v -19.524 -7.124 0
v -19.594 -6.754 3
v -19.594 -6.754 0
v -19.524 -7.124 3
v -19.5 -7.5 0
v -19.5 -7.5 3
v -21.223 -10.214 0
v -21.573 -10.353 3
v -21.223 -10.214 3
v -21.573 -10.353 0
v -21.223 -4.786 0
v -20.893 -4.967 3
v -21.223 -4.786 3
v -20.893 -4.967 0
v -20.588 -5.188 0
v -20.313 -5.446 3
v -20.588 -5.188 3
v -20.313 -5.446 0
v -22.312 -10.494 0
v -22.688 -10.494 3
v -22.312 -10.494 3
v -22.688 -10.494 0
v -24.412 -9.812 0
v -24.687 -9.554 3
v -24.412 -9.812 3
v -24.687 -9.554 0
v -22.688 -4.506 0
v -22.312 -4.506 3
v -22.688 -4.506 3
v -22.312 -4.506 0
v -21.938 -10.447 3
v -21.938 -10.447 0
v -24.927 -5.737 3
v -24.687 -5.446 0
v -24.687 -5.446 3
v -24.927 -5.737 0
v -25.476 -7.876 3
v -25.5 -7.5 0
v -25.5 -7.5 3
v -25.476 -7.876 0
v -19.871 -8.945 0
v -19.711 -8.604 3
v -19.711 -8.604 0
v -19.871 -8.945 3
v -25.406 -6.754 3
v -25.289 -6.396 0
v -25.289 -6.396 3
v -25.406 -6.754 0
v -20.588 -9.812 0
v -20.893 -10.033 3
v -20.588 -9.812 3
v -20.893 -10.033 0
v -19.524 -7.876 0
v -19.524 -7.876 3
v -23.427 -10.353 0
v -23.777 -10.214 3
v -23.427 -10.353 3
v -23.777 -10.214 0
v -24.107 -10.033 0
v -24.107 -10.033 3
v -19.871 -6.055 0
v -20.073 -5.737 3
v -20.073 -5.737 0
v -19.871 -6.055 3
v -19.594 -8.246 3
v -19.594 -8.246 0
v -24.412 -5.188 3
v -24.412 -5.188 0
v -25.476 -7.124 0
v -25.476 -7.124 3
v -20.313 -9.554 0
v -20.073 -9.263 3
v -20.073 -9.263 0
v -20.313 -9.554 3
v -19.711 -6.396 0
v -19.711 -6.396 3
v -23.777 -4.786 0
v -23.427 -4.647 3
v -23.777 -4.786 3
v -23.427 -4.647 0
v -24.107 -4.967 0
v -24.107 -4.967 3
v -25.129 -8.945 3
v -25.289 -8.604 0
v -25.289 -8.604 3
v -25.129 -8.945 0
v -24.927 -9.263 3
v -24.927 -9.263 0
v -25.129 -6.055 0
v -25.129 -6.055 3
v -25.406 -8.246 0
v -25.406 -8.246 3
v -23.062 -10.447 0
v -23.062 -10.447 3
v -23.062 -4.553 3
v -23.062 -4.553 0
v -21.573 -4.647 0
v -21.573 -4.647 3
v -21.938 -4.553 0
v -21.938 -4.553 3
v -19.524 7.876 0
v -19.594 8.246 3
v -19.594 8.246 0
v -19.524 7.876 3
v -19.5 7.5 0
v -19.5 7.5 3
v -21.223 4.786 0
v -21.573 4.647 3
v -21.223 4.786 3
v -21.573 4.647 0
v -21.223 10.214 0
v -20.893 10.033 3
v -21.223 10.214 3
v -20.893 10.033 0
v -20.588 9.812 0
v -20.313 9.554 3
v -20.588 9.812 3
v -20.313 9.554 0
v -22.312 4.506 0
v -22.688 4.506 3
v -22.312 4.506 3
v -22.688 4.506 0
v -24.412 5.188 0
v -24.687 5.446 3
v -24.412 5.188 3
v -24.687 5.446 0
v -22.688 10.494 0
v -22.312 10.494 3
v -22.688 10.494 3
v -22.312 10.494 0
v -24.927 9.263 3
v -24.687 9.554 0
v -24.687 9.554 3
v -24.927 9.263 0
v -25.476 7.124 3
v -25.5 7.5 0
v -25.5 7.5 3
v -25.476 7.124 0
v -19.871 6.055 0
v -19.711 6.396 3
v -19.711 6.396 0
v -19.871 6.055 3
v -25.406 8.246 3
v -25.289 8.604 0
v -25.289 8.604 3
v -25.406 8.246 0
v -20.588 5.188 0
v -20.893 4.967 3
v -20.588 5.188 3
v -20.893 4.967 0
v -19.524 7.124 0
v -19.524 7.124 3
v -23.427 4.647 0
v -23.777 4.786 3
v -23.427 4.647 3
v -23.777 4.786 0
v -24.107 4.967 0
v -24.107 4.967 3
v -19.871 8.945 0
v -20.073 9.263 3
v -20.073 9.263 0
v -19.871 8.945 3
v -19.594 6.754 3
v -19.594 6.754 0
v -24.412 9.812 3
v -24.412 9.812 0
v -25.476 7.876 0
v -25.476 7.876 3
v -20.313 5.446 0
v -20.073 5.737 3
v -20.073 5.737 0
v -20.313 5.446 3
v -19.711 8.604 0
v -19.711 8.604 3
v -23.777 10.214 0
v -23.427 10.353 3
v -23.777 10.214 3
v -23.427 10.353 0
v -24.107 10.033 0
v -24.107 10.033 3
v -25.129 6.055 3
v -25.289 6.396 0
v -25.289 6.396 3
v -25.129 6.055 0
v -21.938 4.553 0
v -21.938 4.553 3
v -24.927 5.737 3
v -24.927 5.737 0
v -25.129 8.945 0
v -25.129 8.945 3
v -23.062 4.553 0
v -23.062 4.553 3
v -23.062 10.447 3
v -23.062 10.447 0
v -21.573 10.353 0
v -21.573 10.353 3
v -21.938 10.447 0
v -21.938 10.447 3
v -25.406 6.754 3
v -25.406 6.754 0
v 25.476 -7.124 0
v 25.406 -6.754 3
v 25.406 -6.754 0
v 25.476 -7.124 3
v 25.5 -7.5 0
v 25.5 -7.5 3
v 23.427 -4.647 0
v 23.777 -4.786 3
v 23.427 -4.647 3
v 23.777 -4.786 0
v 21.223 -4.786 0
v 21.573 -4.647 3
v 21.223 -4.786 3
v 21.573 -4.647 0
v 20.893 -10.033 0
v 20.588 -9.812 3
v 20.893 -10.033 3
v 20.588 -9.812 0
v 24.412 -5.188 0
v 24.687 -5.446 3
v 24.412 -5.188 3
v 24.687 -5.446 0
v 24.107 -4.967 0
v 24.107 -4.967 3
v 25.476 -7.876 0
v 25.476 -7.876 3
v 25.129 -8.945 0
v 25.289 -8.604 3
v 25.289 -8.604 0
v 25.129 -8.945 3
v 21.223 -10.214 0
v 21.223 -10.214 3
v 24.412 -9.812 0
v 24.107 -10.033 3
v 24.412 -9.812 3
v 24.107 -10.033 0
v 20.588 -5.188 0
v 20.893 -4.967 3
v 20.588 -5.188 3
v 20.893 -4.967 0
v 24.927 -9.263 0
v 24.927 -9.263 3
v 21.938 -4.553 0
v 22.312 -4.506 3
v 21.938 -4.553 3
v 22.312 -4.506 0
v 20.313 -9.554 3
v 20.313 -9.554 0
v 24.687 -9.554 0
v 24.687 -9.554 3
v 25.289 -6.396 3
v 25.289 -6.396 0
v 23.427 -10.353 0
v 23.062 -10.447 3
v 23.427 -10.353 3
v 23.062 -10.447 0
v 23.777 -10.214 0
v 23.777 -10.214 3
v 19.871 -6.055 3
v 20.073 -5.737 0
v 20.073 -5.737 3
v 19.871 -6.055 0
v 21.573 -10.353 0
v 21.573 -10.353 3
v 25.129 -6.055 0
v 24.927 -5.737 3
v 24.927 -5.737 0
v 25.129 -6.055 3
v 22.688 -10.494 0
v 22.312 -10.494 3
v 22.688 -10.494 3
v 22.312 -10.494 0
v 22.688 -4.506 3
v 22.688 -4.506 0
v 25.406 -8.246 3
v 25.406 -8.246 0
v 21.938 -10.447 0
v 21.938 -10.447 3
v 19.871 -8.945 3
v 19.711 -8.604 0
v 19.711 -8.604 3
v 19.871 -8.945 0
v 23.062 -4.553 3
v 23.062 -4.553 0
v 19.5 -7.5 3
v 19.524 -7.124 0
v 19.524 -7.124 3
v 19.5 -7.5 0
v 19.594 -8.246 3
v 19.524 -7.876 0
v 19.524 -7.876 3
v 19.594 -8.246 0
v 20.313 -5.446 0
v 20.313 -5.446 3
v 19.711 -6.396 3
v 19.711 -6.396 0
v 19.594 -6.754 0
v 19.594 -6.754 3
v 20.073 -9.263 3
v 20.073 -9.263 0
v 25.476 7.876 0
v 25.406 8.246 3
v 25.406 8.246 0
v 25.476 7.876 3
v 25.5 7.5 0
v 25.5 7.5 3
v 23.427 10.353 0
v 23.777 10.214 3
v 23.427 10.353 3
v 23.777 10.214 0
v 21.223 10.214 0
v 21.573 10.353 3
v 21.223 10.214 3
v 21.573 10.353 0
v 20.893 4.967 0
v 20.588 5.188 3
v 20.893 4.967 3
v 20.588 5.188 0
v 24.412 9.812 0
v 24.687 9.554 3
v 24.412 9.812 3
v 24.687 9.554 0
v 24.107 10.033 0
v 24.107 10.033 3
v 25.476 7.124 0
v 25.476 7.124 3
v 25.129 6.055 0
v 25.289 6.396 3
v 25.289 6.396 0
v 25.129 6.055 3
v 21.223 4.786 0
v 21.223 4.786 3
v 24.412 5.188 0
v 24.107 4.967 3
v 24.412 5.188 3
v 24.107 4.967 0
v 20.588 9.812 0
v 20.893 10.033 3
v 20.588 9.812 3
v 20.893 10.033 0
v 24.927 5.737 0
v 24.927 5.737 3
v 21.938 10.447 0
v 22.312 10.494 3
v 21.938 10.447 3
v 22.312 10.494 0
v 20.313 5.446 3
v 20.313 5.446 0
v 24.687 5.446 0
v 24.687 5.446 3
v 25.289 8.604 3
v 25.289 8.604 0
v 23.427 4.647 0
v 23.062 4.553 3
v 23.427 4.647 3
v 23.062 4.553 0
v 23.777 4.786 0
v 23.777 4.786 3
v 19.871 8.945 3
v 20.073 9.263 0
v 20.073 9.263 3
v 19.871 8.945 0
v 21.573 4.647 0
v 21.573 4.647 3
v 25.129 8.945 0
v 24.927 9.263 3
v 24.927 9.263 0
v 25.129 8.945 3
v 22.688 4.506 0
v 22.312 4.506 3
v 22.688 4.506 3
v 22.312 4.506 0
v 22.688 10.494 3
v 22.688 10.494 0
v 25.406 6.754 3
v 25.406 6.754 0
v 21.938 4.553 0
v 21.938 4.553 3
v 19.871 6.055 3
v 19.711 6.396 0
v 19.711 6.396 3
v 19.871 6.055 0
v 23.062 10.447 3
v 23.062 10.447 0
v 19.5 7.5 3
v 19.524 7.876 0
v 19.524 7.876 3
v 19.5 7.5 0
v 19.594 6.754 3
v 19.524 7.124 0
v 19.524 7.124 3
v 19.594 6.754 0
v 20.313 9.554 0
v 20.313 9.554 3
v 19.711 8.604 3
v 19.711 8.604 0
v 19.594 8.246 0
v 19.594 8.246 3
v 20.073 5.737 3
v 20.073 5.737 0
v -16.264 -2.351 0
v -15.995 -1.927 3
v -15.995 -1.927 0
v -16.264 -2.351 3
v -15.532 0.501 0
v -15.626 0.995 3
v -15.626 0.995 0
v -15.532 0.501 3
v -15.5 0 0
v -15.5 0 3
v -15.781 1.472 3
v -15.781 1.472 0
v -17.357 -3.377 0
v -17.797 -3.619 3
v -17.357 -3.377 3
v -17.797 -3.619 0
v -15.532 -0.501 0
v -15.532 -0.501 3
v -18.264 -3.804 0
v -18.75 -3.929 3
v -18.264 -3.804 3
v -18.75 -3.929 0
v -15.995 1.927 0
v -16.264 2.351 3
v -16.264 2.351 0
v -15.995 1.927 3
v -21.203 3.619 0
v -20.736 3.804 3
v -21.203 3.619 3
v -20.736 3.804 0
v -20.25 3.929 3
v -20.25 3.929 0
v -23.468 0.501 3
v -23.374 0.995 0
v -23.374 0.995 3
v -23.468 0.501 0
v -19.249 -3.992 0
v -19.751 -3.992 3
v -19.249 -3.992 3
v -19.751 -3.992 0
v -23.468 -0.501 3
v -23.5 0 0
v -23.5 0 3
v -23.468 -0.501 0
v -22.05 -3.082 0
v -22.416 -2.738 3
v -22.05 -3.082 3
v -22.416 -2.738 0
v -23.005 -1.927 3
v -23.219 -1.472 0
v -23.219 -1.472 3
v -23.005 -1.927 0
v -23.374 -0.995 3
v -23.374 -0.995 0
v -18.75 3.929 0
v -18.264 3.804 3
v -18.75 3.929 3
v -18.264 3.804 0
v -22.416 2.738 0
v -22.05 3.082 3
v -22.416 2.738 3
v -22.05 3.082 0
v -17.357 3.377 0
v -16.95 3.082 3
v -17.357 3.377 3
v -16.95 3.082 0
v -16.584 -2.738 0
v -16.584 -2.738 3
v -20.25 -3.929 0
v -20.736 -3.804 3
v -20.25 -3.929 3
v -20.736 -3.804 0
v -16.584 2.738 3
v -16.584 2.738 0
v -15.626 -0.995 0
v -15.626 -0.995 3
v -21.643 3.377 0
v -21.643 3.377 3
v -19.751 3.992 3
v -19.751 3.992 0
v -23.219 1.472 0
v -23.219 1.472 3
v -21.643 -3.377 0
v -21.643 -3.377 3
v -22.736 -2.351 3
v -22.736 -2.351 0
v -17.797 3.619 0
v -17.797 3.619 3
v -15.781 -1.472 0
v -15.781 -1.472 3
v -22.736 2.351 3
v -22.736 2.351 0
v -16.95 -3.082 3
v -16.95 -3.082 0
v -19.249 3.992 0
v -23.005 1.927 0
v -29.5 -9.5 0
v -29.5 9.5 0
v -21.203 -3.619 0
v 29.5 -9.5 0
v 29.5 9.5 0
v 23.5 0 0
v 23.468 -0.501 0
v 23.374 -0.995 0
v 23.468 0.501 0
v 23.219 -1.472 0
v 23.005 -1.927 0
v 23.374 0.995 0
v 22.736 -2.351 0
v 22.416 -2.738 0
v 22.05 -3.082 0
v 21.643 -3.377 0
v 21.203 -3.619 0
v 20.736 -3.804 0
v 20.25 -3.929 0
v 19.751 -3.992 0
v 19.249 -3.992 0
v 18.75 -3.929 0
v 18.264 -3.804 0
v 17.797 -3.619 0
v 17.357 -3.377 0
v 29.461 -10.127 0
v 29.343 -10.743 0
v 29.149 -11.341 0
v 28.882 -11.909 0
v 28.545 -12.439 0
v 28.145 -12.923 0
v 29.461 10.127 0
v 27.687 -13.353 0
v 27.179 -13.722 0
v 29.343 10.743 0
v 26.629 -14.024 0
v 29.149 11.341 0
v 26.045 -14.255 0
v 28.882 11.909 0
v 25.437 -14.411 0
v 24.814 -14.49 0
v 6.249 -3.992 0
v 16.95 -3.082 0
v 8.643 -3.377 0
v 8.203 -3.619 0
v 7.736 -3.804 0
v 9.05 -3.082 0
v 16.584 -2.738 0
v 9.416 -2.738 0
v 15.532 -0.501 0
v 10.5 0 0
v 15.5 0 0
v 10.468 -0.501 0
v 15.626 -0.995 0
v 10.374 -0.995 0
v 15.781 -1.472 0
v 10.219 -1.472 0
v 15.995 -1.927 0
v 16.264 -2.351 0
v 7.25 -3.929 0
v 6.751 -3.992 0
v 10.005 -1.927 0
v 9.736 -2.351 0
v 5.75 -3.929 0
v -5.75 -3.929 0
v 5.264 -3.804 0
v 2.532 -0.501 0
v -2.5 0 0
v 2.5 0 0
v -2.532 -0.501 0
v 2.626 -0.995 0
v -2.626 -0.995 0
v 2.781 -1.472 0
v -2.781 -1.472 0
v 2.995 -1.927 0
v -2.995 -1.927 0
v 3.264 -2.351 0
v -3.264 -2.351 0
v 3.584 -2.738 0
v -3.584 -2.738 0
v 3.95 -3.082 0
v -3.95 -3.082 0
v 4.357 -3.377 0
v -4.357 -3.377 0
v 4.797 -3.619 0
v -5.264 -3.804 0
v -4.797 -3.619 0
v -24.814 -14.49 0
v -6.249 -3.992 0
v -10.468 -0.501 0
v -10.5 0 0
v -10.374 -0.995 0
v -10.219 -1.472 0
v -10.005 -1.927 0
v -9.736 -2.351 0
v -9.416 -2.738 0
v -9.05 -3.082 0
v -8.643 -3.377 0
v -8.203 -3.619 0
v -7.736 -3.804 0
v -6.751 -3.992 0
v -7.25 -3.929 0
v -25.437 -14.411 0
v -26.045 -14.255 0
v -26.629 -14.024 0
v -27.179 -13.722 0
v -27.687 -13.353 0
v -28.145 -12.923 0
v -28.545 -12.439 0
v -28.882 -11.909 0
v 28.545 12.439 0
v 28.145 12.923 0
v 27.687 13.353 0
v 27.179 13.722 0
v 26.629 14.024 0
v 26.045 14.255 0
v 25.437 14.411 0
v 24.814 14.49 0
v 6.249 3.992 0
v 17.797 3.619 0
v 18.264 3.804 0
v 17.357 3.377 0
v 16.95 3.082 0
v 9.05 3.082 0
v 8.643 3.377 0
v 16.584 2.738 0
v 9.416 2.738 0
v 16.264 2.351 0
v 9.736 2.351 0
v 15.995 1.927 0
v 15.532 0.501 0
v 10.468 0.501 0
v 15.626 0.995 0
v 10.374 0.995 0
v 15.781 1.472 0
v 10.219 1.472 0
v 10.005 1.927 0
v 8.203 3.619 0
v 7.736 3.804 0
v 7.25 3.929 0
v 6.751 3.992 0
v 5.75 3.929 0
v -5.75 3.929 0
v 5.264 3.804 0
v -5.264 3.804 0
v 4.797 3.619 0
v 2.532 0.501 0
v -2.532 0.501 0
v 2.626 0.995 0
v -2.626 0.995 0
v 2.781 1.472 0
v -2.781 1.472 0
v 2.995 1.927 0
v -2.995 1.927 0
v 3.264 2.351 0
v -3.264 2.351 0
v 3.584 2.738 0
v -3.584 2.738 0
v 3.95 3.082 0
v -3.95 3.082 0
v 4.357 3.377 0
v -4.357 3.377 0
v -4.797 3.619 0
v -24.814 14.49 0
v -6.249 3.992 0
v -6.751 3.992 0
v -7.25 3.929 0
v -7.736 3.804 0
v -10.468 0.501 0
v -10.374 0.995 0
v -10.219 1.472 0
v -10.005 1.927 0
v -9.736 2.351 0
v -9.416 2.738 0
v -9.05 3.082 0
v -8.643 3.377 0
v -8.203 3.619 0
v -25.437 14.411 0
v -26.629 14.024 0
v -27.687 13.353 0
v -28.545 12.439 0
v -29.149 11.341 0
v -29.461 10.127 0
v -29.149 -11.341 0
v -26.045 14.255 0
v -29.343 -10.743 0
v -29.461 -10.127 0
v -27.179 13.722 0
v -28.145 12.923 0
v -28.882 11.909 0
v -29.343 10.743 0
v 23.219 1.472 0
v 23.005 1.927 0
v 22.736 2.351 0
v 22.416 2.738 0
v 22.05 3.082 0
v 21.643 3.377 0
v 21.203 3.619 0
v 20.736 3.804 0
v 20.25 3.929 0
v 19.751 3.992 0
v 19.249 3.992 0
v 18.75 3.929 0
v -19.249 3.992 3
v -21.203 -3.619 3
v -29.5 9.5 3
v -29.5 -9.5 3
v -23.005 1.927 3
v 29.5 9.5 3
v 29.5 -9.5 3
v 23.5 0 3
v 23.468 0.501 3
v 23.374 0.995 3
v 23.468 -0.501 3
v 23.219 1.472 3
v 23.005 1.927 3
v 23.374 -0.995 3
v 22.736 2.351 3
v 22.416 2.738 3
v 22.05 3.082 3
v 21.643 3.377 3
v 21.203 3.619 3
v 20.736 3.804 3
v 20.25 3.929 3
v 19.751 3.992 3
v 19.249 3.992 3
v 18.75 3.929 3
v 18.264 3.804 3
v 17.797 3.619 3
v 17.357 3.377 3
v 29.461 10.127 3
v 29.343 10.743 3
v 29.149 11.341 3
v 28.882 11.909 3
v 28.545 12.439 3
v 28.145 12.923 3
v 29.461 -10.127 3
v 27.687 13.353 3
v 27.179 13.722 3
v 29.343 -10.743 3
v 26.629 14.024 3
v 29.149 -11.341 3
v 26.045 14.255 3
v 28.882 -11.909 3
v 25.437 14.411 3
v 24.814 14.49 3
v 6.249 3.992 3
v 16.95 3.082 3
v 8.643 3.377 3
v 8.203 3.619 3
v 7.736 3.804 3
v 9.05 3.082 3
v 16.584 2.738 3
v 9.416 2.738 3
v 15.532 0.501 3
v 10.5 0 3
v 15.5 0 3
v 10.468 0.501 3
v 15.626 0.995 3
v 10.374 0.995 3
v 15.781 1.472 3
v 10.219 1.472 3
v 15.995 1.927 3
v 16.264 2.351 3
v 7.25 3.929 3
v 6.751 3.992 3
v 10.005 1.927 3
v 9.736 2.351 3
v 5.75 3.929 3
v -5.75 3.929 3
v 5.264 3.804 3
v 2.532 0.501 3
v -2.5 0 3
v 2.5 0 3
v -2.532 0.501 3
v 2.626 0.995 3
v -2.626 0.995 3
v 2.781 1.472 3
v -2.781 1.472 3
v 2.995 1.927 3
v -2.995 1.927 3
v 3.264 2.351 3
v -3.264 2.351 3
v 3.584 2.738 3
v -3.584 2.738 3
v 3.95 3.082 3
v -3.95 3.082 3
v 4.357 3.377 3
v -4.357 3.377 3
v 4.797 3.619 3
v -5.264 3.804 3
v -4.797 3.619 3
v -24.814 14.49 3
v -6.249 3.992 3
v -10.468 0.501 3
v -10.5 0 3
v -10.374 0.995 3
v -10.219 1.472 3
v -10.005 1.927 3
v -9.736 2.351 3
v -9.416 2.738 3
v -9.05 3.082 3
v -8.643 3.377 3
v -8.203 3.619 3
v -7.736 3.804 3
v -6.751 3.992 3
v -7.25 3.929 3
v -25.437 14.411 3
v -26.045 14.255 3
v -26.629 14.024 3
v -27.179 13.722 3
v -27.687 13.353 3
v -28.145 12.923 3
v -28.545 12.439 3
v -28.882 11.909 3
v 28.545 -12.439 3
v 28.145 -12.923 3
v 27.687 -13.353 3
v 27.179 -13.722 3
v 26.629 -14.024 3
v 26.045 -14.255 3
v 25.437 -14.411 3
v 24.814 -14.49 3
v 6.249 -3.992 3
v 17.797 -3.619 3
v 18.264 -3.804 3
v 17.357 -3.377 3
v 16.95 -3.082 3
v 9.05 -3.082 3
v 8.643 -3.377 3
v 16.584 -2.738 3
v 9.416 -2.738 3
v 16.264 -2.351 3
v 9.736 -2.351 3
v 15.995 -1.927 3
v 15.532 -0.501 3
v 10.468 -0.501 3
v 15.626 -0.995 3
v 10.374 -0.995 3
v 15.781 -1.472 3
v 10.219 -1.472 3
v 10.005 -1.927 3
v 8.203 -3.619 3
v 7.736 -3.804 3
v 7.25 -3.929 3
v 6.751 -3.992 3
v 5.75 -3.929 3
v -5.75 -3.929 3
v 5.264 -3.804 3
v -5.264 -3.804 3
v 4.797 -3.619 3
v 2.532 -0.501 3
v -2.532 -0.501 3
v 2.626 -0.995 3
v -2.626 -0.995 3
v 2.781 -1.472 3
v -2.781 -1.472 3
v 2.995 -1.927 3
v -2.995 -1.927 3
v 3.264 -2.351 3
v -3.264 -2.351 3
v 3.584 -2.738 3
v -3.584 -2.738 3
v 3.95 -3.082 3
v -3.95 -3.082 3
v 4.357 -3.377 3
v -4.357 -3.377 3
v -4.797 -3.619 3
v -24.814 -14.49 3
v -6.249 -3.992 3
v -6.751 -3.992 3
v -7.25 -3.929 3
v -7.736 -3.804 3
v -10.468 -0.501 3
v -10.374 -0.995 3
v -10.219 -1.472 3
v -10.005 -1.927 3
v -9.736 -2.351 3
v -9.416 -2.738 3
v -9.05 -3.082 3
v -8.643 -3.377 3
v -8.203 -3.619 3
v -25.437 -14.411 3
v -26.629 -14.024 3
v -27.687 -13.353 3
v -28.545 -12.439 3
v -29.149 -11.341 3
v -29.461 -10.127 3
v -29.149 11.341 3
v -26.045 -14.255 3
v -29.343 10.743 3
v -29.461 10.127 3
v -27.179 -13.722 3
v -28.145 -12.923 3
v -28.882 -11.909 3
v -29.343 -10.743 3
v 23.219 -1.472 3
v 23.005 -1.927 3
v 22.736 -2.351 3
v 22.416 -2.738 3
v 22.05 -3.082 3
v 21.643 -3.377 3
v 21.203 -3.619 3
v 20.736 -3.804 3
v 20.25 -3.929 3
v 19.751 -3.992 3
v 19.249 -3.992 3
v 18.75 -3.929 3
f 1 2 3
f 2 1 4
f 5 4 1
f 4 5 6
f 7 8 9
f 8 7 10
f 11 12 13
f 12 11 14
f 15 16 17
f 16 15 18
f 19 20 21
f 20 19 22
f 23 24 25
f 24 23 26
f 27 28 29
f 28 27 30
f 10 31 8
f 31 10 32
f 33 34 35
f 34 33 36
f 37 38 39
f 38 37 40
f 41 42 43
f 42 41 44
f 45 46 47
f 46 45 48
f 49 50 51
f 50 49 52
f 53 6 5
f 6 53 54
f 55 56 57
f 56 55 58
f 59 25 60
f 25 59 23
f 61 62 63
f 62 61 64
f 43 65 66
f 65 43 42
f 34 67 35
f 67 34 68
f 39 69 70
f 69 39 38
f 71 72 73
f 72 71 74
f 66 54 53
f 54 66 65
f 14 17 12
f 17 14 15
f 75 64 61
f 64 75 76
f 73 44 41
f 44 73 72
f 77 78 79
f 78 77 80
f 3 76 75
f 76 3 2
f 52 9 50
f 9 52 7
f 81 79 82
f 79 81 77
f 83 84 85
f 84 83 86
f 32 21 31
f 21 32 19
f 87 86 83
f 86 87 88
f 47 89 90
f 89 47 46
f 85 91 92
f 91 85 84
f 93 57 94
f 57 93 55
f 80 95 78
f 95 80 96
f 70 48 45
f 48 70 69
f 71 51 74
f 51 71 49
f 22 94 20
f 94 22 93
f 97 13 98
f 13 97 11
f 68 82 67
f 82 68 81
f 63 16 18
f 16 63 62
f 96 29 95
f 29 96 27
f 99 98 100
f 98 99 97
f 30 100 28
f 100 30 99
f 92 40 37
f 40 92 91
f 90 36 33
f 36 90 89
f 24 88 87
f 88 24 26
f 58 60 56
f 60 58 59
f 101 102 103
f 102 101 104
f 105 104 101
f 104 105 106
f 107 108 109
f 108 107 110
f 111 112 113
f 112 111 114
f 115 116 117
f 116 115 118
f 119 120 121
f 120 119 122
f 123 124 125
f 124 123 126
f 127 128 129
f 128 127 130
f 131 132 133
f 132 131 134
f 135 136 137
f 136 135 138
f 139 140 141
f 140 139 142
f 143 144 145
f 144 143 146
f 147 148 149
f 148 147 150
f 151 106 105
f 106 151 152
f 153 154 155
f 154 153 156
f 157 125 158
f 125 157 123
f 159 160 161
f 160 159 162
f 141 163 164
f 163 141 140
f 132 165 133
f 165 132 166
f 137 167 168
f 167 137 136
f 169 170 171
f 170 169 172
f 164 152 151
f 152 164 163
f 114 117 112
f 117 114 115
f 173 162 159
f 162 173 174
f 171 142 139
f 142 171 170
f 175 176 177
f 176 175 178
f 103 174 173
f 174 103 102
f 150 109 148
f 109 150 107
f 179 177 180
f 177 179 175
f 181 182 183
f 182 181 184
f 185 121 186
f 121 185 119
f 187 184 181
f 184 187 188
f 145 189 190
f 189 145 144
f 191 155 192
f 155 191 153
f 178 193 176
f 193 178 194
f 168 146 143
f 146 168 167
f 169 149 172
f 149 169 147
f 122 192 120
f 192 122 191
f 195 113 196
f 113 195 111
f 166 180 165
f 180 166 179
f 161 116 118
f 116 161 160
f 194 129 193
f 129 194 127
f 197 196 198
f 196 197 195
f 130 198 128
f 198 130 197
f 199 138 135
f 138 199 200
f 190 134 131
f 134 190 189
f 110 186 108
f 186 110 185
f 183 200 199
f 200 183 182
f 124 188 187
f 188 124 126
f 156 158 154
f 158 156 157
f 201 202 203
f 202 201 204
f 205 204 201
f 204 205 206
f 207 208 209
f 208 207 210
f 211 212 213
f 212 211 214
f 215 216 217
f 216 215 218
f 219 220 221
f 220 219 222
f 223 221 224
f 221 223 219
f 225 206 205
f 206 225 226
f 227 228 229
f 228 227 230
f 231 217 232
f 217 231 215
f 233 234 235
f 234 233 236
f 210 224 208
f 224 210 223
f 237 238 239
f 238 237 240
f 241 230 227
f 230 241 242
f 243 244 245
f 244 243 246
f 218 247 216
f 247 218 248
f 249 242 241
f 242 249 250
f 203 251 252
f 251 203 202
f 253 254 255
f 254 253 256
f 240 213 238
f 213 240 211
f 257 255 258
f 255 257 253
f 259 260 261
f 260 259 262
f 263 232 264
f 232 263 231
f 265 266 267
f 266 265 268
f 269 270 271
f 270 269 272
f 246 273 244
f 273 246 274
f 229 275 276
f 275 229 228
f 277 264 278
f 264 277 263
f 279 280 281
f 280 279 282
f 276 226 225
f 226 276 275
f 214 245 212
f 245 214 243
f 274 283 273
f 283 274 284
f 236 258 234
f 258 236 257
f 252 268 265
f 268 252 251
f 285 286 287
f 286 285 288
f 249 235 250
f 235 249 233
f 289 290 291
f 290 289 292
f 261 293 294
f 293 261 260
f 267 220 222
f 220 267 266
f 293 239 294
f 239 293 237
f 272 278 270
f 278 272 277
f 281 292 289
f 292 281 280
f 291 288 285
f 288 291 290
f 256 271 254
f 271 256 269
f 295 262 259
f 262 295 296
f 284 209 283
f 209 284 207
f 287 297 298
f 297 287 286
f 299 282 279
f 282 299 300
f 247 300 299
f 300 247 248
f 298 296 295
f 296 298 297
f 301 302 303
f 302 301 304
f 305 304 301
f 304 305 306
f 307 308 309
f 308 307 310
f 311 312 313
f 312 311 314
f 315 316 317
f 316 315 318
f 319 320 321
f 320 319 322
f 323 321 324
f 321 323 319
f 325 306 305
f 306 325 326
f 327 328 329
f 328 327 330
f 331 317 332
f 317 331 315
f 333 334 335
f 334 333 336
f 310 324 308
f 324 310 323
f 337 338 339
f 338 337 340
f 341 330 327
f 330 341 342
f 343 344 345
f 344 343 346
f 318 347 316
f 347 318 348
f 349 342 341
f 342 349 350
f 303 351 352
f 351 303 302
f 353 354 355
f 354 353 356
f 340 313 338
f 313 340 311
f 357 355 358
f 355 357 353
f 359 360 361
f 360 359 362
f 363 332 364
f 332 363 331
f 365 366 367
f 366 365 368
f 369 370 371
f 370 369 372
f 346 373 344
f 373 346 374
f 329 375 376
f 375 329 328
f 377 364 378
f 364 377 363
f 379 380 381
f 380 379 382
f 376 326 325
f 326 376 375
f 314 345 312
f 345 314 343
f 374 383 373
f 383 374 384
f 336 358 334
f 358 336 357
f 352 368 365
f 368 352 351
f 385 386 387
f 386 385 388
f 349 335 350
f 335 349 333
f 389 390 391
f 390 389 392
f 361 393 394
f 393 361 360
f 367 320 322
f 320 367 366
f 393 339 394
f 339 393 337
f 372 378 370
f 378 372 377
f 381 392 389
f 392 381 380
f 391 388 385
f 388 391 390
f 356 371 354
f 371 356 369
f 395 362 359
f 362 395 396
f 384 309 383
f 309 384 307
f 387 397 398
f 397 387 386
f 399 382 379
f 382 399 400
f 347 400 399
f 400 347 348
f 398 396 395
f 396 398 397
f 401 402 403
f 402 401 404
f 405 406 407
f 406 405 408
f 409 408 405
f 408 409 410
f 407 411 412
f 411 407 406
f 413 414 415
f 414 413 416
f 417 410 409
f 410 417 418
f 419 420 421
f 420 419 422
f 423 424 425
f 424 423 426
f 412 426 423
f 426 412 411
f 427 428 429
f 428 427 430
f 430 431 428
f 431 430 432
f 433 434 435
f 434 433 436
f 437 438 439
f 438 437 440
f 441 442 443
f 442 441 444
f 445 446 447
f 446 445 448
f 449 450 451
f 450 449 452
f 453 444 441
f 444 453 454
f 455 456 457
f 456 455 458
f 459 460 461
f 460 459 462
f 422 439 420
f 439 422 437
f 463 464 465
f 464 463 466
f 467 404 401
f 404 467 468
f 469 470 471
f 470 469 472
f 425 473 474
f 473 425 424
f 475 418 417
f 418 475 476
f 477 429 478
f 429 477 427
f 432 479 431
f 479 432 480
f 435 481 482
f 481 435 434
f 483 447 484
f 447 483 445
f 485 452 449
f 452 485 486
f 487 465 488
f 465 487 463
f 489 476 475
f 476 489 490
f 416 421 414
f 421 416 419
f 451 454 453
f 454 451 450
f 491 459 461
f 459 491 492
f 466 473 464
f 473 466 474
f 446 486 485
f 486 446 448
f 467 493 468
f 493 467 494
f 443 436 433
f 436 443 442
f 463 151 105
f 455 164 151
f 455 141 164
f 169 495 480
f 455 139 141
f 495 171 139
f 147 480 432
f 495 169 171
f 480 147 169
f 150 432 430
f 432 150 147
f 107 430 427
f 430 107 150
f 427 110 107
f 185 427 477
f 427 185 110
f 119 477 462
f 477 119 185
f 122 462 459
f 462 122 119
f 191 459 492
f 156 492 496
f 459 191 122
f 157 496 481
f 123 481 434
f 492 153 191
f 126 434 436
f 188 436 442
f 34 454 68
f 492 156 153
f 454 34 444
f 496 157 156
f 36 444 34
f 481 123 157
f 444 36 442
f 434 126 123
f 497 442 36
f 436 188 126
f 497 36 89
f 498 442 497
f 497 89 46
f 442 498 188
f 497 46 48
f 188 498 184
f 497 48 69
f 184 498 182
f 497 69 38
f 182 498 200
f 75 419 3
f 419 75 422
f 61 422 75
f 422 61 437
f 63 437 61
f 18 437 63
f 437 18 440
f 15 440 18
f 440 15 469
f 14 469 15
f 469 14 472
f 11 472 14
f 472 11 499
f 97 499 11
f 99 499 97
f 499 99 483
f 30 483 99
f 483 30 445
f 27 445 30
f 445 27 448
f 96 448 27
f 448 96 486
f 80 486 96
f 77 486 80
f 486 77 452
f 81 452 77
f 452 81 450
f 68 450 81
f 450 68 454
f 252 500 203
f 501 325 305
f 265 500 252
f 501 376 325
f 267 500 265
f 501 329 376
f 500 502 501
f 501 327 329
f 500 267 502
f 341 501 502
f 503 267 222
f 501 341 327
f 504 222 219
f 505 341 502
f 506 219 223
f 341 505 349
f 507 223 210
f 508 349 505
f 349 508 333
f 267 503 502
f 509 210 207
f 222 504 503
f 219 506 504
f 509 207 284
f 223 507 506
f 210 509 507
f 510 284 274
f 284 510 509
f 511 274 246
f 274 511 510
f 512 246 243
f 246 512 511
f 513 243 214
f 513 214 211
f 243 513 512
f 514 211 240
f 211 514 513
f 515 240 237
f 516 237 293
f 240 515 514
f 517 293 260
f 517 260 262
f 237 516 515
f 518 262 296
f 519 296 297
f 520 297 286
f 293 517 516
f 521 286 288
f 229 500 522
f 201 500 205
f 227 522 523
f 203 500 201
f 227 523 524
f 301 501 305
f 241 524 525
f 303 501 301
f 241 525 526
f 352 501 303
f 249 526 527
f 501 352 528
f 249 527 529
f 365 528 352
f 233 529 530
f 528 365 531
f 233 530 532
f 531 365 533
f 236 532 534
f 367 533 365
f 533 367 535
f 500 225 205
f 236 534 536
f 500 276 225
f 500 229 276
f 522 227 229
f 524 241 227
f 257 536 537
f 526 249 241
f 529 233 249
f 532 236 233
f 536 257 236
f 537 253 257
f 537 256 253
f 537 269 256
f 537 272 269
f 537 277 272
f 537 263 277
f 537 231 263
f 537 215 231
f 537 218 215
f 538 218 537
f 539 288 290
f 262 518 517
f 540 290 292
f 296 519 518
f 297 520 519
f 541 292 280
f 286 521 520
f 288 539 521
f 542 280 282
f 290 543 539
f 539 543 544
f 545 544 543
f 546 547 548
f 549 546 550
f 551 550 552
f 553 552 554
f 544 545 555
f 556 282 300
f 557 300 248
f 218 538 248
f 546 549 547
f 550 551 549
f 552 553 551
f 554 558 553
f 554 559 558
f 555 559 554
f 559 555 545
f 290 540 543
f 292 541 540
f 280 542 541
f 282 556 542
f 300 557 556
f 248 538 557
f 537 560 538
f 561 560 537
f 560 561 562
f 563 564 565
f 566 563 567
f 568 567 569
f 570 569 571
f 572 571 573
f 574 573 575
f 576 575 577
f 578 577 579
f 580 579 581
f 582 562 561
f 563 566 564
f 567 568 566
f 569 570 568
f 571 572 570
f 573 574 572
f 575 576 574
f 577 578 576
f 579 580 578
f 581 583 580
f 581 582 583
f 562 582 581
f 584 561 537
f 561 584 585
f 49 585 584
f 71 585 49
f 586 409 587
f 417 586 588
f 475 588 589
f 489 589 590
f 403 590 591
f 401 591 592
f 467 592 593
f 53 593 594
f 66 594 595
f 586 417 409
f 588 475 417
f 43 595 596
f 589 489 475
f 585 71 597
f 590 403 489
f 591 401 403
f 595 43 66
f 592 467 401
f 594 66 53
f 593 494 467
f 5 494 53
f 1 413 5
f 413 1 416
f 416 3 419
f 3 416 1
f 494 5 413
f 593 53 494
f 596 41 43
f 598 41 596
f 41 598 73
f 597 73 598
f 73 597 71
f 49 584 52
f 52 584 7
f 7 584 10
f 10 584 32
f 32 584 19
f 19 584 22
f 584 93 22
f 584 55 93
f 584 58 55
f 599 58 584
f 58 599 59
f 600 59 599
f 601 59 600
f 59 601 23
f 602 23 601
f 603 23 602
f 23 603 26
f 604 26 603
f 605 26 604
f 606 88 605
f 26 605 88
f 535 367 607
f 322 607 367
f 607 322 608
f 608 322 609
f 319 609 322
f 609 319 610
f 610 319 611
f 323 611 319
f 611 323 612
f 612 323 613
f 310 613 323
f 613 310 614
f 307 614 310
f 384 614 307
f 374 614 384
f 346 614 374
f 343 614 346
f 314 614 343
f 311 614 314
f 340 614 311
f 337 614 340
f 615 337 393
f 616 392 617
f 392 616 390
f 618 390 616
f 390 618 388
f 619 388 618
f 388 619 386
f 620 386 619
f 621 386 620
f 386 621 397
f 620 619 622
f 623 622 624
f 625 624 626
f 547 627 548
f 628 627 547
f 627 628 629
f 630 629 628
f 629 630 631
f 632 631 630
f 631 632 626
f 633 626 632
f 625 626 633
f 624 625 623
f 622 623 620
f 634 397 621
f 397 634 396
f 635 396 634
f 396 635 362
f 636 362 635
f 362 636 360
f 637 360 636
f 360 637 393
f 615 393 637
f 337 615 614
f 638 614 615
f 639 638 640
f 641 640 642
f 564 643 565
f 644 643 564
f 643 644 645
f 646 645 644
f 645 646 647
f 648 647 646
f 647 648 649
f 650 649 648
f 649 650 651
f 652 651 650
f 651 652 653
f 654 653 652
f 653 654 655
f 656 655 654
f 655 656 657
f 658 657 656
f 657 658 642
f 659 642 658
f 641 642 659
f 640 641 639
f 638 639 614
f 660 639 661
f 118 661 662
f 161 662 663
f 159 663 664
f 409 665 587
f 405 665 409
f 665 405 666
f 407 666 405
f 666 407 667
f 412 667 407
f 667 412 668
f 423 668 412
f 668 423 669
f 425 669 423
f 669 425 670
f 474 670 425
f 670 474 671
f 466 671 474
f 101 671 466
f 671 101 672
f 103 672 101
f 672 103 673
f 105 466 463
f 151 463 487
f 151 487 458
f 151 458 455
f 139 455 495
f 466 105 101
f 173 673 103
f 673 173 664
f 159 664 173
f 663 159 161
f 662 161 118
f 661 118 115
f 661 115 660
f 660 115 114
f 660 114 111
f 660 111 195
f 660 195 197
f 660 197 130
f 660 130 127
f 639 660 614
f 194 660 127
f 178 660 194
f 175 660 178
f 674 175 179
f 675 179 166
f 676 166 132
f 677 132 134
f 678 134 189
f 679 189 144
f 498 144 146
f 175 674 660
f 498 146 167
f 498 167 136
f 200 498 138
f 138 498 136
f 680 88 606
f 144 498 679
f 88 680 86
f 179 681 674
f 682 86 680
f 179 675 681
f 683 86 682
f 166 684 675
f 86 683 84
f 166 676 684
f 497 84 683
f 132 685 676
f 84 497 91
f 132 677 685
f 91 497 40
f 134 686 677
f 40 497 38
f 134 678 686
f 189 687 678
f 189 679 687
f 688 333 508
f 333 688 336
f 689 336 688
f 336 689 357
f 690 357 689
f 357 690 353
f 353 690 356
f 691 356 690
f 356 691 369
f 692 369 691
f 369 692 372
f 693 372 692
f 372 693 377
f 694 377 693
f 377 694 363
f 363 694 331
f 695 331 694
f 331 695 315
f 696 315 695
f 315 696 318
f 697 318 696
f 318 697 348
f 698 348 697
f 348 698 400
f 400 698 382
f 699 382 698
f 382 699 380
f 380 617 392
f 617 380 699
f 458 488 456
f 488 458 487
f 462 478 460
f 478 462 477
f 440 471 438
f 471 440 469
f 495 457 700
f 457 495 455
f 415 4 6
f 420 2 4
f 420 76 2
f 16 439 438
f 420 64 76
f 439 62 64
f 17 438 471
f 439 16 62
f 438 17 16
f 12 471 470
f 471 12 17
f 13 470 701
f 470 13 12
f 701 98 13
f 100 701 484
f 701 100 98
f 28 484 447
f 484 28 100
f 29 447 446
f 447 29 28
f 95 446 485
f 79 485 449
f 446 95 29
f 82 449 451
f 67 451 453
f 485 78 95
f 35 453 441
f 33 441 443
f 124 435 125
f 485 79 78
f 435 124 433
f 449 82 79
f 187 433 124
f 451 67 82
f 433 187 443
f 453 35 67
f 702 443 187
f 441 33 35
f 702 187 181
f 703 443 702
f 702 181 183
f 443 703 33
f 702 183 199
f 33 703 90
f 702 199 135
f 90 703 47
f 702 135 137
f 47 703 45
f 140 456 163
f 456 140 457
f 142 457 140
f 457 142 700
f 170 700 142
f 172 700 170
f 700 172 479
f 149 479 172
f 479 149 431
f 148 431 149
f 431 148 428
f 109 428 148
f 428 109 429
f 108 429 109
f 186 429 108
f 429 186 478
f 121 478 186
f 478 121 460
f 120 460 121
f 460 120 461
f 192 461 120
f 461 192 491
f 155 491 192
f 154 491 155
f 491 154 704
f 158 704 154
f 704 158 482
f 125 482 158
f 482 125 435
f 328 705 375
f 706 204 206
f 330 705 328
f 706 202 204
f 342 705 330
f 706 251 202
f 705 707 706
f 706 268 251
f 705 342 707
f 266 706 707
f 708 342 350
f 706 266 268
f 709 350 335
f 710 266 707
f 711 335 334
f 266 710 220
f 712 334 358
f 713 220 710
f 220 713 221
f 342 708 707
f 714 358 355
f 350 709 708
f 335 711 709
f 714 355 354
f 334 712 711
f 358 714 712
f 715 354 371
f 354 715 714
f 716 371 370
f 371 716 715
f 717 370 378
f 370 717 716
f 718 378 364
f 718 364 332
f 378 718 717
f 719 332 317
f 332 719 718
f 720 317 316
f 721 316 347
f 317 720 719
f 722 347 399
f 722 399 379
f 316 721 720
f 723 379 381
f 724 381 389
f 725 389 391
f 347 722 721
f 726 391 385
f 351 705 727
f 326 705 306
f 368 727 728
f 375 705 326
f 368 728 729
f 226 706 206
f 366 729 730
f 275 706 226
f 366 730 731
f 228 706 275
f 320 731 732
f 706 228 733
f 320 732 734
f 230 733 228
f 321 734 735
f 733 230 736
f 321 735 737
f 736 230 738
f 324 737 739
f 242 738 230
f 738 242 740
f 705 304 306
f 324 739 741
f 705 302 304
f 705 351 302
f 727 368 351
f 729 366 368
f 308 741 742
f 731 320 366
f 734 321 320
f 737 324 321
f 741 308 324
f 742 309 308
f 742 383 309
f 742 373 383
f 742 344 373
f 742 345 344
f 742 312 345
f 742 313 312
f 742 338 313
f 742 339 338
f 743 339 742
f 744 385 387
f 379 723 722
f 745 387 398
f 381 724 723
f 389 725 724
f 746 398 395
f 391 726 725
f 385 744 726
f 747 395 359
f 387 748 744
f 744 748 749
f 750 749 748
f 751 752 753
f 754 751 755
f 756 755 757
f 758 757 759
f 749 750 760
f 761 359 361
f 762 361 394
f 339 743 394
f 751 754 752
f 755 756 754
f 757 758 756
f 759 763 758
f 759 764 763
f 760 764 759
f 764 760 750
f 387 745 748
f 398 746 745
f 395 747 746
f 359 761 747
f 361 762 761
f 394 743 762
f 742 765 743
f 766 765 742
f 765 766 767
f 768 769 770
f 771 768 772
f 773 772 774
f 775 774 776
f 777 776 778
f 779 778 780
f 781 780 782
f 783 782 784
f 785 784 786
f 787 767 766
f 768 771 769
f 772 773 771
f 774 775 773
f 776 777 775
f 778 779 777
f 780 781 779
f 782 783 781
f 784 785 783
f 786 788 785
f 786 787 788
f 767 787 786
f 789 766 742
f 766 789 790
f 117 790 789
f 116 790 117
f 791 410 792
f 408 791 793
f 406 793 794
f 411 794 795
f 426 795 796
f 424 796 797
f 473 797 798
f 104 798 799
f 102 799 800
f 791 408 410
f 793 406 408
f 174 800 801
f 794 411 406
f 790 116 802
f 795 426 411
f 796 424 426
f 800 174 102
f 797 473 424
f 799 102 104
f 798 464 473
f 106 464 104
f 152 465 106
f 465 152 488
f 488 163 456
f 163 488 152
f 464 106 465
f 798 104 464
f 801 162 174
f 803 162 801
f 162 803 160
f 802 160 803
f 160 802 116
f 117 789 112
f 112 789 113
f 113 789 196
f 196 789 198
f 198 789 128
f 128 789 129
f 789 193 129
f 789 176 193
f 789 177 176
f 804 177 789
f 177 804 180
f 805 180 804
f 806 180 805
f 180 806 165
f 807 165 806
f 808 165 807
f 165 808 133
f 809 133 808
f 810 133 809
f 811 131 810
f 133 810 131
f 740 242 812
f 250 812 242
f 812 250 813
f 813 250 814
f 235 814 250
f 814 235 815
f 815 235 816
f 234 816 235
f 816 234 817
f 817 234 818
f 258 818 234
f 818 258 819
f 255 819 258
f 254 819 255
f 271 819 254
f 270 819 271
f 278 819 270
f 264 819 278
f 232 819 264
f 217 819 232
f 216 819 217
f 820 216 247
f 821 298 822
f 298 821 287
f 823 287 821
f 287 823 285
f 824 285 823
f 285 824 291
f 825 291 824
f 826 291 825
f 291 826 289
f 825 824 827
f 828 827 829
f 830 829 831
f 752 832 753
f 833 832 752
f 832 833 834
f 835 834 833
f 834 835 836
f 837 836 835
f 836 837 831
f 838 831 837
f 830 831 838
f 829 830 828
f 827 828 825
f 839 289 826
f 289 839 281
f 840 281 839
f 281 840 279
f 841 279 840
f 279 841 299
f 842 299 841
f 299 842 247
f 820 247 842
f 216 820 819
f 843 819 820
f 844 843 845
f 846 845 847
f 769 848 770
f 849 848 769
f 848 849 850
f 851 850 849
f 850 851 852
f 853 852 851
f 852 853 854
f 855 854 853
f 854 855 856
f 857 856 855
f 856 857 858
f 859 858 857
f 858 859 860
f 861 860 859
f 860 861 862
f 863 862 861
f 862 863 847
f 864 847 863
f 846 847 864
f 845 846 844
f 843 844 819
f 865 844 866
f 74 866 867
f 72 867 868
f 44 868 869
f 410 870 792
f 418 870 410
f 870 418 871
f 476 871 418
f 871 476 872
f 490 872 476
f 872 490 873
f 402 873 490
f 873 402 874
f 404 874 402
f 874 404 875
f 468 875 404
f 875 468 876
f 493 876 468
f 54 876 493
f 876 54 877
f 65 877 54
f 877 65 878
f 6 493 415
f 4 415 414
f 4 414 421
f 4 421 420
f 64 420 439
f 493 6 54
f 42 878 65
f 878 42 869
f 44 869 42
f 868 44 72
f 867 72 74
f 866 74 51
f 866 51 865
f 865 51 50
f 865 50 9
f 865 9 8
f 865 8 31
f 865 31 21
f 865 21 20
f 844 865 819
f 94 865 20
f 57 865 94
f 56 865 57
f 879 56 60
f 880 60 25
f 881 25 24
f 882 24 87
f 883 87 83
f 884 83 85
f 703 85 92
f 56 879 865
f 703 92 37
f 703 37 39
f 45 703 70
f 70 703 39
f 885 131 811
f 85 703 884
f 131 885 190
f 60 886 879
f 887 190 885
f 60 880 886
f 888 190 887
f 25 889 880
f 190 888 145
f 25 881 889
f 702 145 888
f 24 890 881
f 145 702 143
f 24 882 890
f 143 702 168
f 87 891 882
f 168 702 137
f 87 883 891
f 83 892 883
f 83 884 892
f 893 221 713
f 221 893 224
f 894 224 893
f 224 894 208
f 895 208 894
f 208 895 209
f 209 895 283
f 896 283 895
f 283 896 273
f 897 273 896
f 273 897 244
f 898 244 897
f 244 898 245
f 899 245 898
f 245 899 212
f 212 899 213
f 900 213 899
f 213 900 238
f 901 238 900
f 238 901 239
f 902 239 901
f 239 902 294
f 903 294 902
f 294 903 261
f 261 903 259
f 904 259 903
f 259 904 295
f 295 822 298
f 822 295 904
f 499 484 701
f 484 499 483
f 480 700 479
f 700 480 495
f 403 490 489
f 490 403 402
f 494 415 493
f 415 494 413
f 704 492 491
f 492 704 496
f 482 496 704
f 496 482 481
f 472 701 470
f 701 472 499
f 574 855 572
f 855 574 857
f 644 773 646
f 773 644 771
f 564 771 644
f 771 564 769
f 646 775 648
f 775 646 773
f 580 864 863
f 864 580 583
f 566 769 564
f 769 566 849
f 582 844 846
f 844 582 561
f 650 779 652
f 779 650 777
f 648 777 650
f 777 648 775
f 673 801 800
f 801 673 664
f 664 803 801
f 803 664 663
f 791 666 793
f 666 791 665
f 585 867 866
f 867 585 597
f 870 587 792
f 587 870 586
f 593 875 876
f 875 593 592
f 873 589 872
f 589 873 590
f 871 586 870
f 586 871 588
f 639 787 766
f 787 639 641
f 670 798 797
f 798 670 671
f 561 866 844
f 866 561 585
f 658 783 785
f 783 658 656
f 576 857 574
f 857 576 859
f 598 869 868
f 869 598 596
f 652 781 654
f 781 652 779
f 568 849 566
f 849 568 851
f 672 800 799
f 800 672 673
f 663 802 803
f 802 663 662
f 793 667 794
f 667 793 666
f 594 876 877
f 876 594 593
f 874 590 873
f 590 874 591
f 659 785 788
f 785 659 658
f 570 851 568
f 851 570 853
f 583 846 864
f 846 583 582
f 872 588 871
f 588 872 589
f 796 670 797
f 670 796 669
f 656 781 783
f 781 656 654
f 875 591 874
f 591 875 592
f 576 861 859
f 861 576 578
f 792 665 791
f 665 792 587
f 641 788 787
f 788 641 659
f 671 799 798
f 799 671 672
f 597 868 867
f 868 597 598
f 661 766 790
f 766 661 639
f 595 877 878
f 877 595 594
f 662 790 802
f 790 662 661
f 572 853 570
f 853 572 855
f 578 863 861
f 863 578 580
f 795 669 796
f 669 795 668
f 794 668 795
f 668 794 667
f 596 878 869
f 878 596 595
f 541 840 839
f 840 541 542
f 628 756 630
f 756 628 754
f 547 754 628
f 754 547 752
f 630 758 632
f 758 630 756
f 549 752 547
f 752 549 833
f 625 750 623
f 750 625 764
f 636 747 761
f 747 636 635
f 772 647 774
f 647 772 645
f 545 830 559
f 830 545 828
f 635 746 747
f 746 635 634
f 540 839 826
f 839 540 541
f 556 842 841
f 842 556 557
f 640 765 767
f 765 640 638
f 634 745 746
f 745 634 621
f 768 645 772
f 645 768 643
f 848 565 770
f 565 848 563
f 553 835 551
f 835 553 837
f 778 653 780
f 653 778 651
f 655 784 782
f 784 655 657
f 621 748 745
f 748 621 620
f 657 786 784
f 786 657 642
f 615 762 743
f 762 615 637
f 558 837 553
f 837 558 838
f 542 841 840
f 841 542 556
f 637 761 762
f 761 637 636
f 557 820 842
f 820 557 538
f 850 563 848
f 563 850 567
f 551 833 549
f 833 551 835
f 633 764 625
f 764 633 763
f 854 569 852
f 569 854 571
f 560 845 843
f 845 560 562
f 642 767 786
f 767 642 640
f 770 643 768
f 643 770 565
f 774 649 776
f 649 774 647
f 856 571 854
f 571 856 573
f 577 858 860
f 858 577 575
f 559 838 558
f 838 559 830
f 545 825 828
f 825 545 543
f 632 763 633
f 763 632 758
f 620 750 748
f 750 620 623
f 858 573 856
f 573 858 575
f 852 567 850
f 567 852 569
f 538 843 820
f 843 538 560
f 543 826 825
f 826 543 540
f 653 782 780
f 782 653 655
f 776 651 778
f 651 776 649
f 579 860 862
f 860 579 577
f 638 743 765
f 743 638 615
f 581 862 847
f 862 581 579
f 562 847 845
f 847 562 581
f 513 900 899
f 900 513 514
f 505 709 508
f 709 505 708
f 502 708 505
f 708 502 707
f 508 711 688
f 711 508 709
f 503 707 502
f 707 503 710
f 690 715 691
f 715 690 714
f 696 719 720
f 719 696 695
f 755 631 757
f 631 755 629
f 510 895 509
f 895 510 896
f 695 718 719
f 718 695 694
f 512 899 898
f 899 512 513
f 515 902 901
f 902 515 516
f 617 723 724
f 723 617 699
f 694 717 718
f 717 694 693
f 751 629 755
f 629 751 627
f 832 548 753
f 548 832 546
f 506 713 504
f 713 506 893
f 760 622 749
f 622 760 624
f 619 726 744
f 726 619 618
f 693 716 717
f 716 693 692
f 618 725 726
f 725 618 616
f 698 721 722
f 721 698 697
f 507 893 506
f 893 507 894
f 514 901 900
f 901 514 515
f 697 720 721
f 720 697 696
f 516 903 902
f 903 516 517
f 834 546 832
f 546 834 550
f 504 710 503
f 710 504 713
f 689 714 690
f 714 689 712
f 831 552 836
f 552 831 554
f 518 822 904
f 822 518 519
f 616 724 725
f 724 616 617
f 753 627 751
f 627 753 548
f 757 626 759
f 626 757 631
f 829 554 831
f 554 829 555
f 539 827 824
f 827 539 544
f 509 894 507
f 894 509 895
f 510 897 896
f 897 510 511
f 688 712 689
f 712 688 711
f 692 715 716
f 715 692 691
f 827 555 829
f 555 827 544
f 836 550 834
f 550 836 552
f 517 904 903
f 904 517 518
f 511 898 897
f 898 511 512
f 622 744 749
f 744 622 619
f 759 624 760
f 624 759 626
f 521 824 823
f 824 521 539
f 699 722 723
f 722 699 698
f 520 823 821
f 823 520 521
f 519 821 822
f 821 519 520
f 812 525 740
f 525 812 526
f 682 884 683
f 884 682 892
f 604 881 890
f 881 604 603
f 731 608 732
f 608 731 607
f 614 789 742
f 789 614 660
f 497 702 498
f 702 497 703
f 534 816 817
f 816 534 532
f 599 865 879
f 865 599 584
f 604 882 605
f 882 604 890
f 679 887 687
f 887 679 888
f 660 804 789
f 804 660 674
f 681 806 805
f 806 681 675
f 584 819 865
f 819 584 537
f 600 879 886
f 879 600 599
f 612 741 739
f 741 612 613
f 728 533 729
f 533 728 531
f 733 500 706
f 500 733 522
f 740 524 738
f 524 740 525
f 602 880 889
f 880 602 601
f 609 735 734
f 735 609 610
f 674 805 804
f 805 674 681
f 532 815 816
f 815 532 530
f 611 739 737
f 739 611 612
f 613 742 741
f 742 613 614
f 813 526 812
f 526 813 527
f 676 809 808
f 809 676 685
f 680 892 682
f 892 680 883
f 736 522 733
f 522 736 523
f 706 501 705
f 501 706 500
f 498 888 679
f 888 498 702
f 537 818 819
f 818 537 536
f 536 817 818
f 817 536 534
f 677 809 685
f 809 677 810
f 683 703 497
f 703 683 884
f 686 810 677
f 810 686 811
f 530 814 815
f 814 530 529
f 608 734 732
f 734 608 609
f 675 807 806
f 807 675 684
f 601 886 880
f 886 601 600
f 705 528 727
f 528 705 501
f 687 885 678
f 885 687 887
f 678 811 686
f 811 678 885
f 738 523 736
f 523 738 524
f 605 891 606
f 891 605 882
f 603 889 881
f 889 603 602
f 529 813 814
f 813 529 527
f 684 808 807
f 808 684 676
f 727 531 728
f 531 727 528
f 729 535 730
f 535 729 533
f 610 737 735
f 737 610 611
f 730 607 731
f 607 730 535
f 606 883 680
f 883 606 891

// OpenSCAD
$fn = 50;


difference() {
	union() {
		hull() {
			translate(v = [-24.5000000000, 9.5000000000, 0]) {
				cylinder(h = 3, r = 5);
			}
			translate(v = [24.5000000000, 9.5000000000, 0]) {
				cylinder(h = 3, r = 5);
			}
			translate(v = [-24.5000000000, -9.5000000000, 0]) {
				cylinder(h = 3, r = 5);
			}
			translate(v = [24.5000000000, -9.5000000000, 0]) {
				cylinder(h = 3, r = 5);
			}
		}
	}
	union() {
		#translate(v = [-22.5000000000, -7.5000000000, -100.0000000000]) {
			cylinder(h = 200, r = 3.0000000000);
		}
		#translate(v = [-22.5000000000, 7.5000000000, -100.0000000000]) {
			cylinder(h = 200, r = 3.0000000000);
		}
		#translate(v = [22.5000000000, -7.5000000000, -100.0000000000]) {
			cylinder(h = 200, r = 3.0000000000);
		}
		#translate(v = [22.5000000000, 7.5000000000, -100.0000000000]) {
			cylinder(h = 200, r = 3.0000000000);
		}
		#translate(v = [-19.5000000000, 0, 0]) {
			cylinder(h = 3, r = 4.0000000000);
		}
		#translate(v = [-6.5000000000, 0, 0]) {
			cylinder(h = 3, r = 4.0000000000);
		}
		#translate(v = [6.5000000000, 0, 0]) {
			cylinder(h = 3, r = 4.0000000000);
		}
		#translate(v = [19.5000000000, 0, 0]) {
			cylinder(h = 3, r = 4.0000000000);
		}
	}
}
